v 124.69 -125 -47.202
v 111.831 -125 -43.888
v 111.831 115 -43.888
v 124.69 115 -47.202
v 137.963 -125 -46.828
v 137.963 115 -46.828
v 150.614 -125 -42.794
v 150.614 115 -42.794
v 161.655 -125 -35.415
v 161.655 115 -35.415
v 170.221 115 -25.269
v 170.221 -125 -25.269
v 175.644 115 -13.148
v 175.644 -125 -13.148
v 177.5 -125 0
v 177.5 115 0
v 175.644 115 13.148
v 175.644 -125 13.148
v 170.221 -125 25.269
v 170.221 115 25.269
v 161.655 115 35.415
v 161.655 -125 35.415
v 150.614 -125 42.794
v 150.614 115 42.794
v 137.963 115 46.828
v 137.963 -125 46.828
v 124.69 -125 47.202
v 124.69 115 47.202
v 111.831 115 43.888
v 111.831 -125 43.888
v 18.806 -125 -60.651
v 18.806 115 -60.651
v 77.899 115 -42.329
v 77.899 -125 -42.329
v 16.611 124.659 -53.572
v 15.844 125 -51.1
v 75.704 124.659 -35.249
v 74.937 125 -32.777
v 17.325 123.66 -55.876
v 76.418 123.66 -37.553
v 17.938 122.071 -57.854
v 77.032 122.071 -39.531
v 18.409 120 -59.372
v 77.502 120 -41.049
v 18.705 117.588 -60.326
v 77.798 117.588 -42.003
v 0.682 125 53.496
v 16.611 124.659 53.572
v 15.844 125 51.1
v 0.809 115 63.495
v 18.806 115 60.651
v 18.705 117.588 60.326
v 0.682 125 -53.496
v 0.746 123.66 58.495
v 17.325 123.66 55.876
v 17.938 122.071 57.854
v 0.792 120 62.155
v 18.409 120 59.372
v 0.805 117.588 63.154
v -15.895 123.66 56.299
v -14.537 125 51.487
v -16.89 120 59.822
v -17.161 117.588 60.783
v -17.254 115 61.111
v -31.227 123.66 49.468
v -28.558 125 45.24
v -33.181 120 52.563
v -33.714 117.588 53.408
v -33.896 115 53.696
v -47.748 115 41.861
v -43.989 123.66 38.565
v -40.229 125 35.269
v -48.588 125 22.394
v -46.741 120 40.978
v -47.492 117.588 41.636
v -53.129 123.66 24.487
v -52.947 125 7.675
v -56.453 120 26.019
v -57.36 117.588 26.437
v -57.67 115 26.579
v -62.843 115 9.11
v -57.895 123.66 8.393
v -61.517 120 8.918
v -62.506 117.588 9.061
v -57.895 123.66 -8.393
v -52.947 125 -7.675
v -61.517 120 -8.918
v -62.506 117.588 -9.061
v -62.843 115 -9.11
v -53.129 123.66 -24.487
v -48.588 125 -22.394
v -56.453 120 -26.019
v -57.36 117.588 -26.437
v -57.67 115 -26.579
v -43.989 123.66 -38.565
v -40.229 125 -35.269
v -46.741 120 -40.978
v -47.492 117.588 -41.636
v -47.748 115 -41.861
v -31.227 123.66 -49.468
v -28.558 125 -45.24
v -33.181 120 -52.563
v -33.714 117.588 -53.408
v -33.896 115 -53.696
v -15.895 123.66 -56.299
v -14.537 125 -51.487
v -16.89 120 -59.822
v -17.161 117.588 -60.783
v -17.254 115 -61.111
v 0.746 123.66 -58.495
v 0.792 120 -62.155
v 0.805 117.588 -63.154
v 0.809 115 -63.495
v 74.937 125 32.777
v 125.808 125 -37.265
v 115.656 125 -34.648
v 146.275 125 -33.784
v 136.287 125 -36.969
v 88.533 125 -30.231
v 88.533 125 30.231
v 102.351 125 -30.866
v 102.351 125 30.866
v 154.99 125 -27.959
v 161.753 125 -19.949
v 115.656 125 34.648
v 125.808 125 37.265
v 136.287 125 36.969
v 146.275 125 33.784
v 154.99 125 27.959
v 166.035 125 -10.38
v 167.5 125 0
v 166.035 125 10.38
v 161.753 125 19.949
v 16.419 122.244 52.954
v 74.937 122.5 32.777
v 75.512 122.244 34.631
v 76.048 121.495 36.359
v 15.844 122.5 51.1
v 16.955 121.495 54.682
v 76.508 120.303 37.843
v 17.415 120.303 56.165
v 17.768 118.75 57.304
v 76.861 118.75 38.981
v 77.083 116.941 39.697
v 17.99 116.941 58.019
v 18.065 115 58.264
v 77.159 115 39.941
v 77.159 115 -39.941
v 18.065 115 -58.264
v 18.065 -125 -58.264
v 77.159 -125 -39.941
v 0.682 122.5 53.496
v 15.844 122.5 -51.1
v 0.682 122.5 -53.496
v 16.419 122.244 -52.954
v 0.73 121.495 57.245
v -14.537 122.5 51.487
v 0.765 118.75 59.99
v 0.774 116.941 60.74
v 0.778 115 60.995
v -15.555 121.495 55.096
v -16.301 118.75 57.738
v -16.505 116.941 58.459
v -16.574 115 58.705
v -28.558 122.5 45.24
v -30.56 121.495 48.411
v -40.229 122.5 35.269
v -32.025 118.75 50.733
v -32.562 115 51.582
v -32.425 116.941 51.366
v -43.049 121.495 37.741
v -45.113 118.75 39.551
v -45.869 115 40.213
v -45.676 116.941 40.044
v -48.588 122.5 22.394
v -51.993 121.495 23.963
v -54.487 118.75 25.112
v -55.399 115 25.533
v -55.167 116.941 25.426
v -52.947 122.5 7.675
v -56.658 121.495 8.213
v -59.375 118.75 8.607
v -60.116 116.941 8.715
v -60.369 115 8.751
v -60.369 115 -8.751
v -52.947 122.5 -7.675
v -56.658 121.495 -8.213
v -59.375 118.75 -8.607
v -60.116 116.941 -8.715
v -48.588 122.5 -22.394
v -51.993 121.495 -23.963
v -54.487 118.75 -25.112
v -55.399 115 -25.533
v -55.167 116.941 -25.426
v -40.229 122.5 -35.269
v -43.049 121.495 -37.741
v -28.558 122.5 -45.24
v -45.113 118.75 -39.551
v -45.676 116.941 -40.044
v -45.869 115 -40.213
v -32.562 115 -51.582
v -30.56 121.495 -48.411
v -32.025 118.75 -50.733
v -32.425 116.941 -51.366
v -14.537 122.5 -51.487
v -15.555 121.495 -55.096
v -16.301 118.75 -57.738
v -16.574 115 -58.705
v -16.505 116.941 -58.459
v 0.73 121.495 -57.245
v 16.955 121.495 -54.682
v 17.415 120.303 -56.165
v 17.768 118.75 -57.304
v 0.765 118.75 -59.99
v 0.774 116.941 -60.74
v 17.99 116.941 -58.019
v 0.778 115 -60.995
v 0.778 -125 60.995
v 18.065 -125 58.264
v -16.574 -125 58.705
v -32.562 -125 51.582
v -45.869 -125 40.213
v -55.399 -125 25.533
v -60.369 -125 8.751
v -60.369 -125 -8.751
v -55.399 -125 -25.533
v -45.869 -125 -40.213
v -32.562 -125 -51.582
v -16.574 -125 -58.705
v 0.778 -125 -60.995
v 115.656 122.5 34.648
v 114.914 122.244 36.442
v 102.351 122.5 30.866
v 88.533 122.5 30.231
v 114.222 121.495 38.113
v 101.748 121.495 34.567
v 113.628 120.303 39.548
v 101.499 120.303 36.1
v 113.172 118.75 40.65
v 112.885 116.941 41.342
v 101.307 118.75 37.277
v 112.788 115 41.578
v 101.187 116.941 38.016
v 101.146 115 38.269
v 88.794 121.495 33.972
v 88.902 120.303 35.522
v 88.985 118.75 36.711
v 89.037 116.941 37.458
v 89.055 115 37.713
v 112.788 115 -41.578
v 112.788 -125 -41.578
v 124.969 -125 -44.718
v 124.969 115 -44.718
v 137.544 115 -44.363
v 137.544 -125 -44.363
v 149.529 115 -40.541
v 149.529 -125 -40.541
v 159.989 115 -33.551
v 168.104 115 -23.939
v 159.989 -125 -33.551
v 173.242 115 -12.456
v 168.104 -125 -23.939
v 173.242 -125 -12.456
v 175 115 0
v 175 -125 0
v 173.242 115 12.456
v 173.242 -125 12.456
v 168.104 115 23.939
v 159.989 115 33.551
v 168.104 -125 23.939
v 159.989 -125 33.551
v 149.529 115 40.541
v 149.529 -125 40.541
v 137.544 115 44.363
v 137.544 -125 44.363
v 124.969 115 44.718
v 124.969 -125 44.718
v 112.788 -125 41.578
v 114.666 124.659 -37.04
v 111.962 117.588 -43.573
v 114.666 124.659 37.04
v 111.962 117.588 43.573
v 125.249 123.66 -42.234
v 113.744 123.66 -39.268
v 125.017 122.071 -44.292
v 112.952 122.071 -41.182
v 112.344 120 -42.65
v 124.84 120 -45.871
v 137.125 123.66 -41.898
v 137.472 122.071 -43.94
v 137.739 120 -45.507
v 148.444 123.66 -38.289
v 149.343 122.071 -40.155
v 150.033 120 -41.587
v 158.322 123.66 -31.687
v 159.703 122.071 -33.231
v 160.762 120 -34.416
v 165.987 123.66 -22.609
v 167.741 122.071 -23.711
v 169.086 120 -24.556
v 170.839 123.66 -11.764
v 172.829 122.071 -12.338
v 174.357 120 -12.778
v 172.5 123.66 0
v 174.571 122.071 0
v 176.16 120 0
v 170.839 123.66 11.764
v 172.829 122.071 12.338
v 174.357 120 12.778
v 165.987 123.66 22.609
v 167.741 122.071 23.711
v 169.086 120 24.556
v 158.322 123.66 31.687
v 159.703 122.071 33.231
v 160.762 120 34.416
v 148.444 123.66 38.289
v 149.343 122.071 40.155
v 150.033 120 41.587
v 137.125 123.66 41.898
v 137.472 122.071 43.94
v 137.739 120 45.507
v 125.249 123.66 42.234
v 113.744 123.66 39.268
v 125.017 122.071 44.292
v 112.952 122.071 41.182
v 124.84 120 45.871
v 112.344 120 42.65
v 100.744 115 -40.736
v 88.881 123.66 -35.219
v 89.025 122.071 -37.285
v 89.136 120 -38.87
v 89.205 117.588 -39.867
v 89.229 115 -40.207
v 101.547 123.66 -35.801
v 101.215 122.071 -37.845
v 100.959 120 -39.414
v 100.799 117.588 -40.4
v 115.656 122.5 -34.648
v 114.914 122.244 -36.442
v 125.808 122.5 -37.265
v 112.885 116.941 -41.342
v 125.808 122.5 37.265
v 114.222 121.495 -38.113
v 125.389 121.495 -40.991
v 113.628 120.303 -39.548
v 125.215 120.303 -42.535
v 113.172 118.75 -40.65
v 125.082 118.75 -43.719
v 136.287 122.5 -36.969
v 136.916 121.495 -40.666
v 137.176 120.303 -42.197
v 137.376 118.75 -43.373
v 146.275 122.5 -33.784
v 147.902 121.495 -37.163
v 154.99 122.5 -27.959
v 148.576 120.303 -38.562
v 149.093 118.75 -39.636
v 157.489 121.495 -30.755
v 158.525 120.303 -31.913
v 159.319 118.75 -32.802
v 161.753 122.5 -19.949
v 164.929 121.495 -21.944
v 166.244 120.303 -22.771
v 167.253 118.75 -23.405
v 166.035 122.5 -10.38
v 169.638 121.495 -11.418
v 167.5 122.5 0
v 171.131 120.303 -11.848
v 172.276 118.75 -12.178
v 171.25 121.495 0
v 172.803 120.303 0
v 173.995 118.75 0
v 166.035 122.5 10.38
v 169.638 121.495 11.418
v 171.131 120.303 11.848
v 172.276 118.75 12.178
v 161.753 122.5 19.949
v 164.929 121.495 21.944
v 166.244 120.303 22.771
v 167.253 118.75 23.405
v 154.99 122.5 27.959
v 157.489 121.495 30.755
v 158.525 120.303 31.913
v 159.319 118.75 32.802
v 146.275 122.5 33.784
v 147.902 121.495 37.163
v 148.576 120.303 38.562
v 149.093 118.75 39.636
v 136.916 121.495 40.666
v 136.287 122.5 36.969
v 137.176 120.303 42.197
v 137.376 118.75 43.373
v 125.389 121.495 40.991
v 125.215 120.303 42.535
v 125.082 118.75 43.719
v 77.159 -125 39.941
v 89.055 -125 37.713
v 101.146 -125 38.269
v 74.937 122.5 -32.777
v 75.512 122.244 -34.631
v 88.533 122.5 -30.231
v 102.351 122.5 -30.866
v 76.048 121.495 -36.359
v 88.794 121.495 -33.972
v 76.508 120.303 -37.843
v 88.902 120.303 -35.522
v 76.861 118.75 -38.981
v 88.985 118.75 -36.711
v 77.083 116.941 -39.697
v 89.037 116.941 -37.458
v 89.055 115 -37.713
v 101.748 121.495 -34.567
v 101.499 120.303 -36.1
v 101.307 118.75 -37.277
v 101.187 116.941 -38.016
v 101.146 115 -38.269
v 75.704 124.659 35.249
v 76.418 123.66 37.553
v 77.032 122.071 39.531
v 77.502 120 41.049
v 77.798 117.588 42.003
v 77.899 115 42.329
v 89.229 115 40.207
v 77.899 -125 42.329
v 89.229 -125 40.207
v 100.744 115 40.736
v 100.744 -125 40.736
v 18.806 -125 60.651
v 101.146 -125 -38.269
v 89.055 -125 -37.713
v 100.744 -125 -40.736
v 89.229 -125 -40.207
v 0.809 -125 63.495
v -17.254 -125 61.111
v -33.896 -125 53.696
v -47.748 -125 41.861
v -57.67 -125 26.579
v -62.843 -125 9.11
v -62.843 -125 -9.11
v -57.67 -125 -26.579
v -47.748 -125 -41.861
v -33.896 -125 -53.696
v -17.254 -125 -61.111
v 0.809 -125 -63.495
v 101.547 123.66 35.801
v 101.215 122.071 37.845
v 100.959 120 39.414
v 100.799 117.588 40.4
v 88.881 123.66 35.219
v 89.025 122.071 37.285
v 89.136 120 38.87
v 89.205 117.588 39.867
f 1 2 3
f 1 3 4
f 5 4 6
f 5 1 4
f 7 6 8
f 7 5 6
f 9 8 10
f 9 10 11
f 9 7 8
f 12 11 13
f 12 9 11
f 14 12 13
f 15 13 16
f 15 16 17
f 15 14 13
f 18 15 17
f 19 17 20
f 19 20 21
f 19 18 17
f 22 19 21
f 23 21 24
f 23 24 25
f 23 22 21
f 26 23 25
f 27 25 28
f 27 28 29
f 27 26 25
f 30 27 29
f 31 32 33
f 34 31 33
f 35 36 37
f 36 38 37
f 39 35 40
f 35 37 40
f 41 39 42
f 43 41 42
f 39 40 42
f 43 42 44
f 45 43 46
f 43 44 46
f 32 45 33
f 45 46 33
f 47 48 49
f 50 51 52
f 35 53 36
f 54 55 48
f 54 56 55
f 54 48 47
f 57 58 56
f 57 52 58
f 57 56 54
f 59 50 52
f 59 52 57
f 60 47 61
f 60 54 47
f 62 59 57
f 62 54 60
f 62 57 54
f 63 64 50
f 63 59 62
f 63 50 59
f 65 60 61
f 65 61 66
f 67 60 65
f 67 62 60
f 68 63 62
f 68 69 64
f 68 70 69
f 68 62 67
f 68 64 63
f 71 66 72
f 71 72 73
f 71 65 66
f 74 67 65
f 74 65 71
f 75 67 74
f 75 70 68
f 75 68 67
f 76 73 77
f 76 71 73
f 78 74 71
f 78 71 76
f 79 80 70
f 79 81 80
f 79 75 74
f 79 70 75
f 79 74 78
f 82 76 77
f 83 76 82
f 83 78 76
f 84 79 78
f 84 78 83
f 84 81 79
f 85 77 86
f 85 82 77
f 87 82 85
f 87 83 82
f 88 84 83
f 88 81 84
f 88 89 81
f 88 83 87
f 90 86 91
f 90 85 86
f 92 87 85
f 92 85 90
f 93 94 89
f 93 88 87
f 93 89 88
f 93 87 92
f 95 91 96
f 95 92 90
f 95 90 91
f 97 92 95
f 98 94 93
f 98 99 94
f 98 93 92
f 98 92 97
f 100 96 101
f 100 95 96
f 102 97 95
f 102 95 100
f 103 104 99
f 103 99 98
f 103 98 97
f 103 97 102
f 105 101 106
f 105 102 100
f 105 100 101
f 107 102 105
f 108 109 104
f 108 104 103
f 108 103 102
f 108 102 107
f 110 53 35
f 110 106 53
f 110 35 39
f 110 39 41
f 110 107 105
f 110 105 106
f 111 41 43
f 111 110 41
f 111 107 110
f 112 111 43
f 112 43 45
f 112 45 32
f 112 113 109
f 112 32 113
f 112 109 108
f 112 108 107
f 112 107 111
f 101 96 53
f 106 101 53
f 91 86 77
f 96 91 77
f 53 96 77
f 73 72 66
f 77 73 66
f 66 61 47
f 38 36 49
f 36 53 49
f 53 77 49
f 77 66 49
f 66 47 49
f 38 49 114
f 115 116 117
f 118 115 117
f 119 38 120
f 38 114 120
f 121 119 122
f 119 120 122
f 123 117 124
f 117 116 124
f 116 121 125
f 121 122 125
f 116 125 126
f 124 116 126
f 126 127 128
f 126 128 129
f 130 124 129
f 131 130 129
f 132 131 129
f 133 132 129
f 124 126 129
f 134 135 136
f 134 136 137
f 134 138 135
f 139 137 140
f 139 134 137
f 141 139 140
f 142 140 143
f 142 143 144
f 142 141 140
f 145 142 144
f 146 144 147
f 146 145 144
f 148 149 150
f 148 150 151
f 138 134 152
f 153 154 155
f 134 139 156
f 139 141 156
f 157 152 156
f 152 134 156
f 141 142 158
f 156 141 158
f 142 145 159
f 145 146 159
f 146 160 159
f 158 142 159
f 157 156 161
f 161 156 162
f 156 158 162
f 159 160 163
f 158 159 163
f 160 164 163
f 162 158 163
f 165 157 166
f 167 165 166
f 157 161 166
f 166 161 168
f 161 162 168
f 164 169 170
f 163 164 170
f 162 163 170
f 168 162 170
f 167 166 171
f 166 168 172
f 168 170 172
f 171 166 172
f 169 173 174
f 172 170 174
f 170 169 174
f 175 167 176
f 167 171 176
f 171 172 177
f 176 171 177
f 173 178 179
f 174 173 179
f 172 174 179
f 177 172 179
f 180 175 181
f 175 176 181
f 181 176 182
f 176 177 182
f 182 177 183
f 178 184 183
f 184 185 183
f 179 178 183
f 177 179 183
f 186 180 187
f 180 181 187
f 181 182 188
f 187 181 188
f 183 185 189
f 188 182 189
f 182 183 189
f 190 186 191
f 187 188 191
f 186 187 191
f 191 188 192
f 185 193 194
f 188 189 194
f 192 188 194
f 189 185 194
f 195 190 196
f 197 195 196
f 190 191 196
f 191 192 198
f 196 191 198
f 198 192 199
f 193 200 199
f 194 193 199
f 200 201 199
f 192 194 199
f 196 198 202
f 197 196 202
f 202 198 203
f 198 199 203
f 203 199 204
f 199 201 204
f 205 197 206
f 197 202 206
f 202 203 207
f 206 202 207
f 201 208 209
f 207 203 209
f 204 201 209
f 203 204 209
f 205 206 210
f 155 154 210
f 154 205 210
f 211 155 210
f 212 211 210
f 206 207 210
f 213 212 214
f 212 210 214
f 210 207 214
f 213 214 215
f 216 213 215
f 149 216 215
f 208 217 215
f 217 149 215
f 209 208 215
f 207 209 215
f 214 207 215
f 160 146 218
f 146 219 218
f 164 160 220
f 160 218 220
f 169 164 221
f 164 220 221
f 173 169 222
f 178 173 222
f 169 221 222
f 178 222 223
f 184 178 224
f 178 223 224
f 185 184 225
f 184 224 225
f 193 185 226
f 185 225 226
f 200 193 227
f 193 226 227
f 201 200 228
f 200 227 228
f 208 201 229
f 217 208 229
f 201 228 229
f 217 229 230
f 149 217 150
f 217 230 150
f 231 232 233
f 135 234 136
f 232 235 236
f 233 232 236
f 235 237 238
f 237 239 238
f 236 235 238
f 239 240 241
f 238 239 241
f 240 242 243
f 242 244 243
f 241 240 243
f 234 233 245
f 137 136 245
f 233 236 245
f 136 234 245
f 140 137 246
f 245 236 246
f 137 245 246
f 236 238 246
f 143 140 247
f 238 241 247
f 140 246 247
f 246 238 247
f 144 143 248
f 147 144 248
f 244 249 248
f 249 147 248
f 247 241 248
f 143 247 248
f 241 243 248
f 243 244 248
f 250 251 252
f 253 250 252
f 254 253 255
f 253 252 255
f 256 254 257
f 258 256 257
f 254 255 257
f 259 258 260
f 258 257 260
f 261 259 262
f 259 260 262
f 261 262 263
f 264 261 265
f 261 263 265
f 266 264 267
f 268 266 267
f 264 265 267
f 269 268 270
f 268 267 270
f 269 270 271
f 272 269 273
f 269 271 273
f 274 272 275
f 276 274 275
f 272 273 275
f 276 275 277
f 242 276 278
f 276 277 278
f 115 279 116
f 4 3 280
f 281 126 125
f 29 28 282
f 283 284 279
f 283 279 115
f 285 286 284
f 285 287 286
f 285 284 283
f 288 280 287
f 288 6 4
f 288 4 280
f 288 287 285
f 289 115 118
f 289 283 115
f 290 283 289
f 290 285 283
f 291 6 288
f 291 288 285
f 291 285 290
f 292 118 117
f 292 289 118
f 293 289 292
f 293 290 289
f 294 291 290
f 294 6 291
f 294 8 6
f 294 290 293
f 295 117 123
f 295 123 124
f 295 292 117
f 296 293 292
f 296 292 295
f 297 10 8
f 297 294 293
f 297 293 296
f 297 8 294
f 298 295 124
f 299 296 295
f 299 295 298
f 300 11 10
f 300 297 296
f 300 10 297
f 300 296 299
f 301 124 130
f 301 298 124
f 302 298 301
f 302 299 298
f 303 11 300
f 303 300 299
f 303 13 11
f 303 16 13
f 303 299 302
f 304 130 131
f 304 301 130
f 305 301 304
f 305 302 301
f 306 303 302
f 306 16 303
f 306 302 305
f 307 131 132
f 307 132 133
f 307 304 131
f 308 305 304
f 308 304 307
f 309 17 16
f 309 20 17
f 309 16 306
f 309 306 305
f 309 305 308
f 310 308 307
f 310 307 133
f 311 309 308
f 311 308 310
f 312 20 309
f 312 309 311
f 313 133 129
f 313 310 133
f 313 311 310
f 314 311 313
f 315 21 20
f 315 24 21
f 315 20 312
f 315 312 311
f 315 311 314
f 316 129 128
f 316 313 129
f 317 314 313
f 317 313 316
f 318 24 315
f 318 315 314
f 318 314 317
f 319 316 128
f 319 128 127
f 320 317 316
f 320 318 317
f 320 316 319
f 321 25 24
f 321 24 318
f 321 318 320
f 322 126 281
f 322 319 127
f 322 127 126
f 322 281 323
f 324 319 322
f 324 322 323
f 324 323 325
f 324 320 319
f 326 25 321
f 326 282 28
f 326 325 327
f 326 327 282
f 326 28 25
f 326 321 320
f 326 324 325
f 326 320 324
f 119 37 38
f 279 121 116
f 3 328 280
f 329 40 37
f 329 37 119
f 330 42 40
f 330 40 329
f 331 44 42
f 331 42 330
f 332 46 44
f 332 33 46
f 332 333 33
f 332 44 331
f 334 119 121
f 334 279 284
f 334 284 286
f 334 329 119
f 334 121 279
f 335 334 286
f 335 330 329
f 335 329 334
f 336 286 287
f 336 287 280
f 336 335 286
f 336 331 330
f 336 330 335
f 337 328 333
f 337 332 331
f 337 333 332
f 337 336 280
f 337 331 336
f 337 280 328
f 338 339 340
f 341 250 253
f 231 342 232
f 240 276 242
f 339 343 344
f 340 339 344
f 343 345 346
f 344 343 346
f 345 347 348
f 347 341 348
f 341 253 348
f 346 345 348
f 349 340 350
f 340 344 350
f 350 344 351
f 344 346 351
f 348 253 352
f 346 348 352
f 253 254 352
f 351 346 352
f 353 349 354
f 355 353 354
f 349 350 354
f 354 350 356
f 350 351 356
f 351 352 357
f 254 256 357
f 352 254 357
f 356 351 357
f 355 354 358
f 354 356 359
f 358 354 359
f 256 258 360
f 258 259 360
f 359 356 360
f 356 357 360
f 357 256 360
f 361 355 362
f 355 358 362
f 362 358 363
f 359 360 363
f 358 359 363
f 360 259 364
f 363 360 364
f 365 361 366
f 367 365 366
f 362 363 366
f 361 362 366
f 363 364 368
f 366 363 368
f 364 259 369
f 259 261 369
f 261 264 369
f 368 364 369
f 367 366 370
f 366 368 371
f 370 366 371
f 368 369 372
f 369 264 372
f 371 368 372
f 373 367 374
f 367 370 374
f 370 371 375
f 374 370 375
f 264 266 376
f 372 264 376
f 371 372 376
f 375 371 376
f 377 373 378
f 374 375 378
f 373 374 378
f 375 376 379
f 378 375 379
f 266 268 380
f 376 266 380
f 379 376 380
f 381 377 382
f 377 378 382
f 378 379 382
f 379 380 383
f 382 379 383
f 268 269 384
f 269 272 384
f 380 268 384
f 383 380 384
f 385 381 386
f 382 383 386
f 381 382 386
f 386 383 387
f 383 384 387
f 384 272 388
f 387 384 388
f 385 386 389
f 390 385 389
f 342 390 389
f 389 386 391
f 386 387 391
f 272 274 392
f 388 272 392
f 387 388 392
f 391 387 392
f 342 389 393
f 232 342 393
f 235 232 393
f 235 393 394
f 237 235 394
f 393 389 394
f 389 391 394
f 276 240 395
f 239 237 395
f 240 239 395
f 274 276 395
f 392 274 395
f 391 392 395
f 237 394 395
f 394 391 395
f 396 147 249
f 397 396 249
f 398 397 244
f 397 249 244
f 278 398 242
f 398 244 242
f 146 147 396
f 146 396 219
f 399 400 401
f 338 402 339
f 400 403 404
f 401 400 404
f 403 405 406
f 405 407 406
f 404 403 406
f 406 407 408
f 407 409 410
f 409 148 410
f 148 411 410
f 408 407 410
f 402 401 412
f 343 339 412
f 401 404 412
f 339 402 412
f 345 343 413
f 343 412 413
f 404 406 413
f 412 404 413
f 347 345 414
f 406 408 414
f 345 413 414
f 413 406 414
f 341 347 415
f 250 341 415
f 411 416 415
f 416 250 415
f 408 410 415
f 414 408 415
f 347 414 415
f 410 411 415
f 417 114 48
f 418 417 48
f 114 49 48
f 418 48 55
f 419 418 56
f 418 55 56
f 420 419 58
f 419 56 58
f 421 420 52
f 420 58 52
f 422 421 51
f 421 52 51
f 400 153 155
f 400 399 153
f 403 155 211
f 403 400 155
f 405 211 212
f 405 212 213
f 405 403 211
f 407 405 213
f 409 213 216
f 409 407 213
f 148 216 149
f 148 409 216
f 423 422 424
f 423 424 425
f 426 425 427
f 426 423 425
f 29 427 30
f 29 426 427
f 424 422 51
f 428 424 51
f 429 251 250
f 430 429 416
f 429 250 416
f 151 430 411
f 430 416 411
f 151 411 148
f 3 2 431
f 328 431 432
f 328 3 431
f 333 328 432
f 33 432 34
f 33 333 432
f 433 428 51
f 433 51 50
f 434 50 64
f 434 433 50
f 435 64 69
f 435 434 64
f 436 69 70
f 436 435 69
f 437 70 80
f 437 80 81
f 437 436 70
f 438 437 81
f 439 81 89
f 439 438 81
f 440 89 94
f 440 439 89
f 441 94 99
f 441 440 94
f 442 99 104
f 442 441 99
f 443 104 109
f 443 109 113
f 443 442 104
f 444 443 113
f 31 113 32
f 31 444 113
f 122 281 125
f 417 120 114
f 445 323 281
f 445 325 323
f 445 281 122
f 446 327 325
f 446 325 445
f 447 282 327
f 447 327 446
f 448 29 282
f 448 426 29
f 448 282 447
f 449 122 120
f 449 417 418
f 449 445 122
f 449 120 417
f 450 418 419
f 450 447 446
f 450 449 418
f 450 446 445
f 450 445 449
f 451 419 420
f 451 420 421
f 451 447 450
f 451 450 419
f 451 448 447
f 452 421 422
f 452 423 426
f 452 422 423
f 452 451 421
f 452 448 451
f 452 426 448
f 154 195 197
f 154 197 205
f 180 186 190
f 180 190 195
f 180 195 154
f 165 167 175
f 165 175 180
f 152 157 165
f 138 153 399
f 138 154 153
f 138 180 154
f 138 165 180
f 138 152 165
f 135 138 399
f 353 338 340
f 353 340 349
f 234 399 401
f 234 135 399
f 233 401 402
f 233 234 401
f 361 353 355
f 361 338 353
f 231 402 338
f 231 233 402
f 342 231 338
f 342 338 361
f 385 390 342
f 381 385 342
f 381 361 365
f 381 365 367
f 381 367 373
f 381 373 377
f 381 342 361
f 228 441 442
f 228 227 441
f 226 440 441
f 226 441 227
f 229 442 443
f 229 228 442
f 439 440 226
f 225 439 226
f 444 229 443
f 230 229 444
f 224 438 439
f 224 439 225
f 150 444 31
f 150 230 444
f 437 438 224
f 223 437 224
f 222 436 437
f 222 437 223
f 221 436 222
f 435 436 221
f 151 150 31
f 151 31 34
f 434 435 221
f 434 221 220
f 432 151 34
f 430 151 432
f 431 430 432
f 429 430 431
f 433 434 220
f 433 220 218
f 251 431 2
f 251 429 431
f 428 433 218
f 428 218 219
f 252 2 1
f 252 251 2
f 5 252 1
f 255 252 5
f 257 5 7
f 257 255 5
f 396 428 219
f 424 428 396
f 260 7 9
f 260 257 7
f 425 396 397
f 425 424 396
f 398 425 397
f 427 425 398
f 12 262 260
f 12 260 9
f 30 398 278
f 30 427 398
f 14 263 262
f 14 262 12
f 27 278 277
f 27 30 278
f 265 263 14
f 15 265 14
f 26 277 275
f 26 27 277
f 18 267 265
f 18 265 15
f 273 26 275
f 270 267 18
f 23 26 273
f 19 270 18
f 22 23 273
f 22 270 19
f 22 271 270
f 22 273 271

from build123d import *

# Parameters (mm, degrees)
F1_DEPTH = 125
F2_R     = 50
F3_R     = 10
F4_T     = -2.5


with BuildPart() as f1:
    # F0 (on Front) → F1 (new body, symmetric)
    with BuildSketch(Plane.XZ):
        with BuildLine():
            Line((98.826939, 35.839786), (18.805769, 60.651406))
            ThreePointArc((18.805769, 60.651406), (-63.5, 0), (18.805769, -60.651406))
            Line((18.805769, -60.651406), (98.826939, -35.839786))
            ThreePointArc((98.826939, -35.839786), (177.5, 0), (98.826939, 35.839786))
        make_face()
    extrude(amount=F1_DEPTH, both=True)

    # F2
    f2_edges = [f1.edges().sort_by_distance(p)[0] for p in [
        (98.826939, 0, 35.839786),
        (98.826939, 0, -35.839786),
    ]]
    fillet(f2_edges, radius=F2_R)

    # F3
    f3_edges = [f1.edges().sort_by_distance(p)[0] for p in [
        (48.352342, 125, -51.490101),
    ]]
    fillet(f3_edges, radius=F3_R)

    # F4
    f4_openings = [f1.faces().sort_by_distance(p)[0] for p in [
        (49.834111, -125, 0),
    ]]
    offset(amount=F4_T, openings=f4_openings)


solid = f1.part
